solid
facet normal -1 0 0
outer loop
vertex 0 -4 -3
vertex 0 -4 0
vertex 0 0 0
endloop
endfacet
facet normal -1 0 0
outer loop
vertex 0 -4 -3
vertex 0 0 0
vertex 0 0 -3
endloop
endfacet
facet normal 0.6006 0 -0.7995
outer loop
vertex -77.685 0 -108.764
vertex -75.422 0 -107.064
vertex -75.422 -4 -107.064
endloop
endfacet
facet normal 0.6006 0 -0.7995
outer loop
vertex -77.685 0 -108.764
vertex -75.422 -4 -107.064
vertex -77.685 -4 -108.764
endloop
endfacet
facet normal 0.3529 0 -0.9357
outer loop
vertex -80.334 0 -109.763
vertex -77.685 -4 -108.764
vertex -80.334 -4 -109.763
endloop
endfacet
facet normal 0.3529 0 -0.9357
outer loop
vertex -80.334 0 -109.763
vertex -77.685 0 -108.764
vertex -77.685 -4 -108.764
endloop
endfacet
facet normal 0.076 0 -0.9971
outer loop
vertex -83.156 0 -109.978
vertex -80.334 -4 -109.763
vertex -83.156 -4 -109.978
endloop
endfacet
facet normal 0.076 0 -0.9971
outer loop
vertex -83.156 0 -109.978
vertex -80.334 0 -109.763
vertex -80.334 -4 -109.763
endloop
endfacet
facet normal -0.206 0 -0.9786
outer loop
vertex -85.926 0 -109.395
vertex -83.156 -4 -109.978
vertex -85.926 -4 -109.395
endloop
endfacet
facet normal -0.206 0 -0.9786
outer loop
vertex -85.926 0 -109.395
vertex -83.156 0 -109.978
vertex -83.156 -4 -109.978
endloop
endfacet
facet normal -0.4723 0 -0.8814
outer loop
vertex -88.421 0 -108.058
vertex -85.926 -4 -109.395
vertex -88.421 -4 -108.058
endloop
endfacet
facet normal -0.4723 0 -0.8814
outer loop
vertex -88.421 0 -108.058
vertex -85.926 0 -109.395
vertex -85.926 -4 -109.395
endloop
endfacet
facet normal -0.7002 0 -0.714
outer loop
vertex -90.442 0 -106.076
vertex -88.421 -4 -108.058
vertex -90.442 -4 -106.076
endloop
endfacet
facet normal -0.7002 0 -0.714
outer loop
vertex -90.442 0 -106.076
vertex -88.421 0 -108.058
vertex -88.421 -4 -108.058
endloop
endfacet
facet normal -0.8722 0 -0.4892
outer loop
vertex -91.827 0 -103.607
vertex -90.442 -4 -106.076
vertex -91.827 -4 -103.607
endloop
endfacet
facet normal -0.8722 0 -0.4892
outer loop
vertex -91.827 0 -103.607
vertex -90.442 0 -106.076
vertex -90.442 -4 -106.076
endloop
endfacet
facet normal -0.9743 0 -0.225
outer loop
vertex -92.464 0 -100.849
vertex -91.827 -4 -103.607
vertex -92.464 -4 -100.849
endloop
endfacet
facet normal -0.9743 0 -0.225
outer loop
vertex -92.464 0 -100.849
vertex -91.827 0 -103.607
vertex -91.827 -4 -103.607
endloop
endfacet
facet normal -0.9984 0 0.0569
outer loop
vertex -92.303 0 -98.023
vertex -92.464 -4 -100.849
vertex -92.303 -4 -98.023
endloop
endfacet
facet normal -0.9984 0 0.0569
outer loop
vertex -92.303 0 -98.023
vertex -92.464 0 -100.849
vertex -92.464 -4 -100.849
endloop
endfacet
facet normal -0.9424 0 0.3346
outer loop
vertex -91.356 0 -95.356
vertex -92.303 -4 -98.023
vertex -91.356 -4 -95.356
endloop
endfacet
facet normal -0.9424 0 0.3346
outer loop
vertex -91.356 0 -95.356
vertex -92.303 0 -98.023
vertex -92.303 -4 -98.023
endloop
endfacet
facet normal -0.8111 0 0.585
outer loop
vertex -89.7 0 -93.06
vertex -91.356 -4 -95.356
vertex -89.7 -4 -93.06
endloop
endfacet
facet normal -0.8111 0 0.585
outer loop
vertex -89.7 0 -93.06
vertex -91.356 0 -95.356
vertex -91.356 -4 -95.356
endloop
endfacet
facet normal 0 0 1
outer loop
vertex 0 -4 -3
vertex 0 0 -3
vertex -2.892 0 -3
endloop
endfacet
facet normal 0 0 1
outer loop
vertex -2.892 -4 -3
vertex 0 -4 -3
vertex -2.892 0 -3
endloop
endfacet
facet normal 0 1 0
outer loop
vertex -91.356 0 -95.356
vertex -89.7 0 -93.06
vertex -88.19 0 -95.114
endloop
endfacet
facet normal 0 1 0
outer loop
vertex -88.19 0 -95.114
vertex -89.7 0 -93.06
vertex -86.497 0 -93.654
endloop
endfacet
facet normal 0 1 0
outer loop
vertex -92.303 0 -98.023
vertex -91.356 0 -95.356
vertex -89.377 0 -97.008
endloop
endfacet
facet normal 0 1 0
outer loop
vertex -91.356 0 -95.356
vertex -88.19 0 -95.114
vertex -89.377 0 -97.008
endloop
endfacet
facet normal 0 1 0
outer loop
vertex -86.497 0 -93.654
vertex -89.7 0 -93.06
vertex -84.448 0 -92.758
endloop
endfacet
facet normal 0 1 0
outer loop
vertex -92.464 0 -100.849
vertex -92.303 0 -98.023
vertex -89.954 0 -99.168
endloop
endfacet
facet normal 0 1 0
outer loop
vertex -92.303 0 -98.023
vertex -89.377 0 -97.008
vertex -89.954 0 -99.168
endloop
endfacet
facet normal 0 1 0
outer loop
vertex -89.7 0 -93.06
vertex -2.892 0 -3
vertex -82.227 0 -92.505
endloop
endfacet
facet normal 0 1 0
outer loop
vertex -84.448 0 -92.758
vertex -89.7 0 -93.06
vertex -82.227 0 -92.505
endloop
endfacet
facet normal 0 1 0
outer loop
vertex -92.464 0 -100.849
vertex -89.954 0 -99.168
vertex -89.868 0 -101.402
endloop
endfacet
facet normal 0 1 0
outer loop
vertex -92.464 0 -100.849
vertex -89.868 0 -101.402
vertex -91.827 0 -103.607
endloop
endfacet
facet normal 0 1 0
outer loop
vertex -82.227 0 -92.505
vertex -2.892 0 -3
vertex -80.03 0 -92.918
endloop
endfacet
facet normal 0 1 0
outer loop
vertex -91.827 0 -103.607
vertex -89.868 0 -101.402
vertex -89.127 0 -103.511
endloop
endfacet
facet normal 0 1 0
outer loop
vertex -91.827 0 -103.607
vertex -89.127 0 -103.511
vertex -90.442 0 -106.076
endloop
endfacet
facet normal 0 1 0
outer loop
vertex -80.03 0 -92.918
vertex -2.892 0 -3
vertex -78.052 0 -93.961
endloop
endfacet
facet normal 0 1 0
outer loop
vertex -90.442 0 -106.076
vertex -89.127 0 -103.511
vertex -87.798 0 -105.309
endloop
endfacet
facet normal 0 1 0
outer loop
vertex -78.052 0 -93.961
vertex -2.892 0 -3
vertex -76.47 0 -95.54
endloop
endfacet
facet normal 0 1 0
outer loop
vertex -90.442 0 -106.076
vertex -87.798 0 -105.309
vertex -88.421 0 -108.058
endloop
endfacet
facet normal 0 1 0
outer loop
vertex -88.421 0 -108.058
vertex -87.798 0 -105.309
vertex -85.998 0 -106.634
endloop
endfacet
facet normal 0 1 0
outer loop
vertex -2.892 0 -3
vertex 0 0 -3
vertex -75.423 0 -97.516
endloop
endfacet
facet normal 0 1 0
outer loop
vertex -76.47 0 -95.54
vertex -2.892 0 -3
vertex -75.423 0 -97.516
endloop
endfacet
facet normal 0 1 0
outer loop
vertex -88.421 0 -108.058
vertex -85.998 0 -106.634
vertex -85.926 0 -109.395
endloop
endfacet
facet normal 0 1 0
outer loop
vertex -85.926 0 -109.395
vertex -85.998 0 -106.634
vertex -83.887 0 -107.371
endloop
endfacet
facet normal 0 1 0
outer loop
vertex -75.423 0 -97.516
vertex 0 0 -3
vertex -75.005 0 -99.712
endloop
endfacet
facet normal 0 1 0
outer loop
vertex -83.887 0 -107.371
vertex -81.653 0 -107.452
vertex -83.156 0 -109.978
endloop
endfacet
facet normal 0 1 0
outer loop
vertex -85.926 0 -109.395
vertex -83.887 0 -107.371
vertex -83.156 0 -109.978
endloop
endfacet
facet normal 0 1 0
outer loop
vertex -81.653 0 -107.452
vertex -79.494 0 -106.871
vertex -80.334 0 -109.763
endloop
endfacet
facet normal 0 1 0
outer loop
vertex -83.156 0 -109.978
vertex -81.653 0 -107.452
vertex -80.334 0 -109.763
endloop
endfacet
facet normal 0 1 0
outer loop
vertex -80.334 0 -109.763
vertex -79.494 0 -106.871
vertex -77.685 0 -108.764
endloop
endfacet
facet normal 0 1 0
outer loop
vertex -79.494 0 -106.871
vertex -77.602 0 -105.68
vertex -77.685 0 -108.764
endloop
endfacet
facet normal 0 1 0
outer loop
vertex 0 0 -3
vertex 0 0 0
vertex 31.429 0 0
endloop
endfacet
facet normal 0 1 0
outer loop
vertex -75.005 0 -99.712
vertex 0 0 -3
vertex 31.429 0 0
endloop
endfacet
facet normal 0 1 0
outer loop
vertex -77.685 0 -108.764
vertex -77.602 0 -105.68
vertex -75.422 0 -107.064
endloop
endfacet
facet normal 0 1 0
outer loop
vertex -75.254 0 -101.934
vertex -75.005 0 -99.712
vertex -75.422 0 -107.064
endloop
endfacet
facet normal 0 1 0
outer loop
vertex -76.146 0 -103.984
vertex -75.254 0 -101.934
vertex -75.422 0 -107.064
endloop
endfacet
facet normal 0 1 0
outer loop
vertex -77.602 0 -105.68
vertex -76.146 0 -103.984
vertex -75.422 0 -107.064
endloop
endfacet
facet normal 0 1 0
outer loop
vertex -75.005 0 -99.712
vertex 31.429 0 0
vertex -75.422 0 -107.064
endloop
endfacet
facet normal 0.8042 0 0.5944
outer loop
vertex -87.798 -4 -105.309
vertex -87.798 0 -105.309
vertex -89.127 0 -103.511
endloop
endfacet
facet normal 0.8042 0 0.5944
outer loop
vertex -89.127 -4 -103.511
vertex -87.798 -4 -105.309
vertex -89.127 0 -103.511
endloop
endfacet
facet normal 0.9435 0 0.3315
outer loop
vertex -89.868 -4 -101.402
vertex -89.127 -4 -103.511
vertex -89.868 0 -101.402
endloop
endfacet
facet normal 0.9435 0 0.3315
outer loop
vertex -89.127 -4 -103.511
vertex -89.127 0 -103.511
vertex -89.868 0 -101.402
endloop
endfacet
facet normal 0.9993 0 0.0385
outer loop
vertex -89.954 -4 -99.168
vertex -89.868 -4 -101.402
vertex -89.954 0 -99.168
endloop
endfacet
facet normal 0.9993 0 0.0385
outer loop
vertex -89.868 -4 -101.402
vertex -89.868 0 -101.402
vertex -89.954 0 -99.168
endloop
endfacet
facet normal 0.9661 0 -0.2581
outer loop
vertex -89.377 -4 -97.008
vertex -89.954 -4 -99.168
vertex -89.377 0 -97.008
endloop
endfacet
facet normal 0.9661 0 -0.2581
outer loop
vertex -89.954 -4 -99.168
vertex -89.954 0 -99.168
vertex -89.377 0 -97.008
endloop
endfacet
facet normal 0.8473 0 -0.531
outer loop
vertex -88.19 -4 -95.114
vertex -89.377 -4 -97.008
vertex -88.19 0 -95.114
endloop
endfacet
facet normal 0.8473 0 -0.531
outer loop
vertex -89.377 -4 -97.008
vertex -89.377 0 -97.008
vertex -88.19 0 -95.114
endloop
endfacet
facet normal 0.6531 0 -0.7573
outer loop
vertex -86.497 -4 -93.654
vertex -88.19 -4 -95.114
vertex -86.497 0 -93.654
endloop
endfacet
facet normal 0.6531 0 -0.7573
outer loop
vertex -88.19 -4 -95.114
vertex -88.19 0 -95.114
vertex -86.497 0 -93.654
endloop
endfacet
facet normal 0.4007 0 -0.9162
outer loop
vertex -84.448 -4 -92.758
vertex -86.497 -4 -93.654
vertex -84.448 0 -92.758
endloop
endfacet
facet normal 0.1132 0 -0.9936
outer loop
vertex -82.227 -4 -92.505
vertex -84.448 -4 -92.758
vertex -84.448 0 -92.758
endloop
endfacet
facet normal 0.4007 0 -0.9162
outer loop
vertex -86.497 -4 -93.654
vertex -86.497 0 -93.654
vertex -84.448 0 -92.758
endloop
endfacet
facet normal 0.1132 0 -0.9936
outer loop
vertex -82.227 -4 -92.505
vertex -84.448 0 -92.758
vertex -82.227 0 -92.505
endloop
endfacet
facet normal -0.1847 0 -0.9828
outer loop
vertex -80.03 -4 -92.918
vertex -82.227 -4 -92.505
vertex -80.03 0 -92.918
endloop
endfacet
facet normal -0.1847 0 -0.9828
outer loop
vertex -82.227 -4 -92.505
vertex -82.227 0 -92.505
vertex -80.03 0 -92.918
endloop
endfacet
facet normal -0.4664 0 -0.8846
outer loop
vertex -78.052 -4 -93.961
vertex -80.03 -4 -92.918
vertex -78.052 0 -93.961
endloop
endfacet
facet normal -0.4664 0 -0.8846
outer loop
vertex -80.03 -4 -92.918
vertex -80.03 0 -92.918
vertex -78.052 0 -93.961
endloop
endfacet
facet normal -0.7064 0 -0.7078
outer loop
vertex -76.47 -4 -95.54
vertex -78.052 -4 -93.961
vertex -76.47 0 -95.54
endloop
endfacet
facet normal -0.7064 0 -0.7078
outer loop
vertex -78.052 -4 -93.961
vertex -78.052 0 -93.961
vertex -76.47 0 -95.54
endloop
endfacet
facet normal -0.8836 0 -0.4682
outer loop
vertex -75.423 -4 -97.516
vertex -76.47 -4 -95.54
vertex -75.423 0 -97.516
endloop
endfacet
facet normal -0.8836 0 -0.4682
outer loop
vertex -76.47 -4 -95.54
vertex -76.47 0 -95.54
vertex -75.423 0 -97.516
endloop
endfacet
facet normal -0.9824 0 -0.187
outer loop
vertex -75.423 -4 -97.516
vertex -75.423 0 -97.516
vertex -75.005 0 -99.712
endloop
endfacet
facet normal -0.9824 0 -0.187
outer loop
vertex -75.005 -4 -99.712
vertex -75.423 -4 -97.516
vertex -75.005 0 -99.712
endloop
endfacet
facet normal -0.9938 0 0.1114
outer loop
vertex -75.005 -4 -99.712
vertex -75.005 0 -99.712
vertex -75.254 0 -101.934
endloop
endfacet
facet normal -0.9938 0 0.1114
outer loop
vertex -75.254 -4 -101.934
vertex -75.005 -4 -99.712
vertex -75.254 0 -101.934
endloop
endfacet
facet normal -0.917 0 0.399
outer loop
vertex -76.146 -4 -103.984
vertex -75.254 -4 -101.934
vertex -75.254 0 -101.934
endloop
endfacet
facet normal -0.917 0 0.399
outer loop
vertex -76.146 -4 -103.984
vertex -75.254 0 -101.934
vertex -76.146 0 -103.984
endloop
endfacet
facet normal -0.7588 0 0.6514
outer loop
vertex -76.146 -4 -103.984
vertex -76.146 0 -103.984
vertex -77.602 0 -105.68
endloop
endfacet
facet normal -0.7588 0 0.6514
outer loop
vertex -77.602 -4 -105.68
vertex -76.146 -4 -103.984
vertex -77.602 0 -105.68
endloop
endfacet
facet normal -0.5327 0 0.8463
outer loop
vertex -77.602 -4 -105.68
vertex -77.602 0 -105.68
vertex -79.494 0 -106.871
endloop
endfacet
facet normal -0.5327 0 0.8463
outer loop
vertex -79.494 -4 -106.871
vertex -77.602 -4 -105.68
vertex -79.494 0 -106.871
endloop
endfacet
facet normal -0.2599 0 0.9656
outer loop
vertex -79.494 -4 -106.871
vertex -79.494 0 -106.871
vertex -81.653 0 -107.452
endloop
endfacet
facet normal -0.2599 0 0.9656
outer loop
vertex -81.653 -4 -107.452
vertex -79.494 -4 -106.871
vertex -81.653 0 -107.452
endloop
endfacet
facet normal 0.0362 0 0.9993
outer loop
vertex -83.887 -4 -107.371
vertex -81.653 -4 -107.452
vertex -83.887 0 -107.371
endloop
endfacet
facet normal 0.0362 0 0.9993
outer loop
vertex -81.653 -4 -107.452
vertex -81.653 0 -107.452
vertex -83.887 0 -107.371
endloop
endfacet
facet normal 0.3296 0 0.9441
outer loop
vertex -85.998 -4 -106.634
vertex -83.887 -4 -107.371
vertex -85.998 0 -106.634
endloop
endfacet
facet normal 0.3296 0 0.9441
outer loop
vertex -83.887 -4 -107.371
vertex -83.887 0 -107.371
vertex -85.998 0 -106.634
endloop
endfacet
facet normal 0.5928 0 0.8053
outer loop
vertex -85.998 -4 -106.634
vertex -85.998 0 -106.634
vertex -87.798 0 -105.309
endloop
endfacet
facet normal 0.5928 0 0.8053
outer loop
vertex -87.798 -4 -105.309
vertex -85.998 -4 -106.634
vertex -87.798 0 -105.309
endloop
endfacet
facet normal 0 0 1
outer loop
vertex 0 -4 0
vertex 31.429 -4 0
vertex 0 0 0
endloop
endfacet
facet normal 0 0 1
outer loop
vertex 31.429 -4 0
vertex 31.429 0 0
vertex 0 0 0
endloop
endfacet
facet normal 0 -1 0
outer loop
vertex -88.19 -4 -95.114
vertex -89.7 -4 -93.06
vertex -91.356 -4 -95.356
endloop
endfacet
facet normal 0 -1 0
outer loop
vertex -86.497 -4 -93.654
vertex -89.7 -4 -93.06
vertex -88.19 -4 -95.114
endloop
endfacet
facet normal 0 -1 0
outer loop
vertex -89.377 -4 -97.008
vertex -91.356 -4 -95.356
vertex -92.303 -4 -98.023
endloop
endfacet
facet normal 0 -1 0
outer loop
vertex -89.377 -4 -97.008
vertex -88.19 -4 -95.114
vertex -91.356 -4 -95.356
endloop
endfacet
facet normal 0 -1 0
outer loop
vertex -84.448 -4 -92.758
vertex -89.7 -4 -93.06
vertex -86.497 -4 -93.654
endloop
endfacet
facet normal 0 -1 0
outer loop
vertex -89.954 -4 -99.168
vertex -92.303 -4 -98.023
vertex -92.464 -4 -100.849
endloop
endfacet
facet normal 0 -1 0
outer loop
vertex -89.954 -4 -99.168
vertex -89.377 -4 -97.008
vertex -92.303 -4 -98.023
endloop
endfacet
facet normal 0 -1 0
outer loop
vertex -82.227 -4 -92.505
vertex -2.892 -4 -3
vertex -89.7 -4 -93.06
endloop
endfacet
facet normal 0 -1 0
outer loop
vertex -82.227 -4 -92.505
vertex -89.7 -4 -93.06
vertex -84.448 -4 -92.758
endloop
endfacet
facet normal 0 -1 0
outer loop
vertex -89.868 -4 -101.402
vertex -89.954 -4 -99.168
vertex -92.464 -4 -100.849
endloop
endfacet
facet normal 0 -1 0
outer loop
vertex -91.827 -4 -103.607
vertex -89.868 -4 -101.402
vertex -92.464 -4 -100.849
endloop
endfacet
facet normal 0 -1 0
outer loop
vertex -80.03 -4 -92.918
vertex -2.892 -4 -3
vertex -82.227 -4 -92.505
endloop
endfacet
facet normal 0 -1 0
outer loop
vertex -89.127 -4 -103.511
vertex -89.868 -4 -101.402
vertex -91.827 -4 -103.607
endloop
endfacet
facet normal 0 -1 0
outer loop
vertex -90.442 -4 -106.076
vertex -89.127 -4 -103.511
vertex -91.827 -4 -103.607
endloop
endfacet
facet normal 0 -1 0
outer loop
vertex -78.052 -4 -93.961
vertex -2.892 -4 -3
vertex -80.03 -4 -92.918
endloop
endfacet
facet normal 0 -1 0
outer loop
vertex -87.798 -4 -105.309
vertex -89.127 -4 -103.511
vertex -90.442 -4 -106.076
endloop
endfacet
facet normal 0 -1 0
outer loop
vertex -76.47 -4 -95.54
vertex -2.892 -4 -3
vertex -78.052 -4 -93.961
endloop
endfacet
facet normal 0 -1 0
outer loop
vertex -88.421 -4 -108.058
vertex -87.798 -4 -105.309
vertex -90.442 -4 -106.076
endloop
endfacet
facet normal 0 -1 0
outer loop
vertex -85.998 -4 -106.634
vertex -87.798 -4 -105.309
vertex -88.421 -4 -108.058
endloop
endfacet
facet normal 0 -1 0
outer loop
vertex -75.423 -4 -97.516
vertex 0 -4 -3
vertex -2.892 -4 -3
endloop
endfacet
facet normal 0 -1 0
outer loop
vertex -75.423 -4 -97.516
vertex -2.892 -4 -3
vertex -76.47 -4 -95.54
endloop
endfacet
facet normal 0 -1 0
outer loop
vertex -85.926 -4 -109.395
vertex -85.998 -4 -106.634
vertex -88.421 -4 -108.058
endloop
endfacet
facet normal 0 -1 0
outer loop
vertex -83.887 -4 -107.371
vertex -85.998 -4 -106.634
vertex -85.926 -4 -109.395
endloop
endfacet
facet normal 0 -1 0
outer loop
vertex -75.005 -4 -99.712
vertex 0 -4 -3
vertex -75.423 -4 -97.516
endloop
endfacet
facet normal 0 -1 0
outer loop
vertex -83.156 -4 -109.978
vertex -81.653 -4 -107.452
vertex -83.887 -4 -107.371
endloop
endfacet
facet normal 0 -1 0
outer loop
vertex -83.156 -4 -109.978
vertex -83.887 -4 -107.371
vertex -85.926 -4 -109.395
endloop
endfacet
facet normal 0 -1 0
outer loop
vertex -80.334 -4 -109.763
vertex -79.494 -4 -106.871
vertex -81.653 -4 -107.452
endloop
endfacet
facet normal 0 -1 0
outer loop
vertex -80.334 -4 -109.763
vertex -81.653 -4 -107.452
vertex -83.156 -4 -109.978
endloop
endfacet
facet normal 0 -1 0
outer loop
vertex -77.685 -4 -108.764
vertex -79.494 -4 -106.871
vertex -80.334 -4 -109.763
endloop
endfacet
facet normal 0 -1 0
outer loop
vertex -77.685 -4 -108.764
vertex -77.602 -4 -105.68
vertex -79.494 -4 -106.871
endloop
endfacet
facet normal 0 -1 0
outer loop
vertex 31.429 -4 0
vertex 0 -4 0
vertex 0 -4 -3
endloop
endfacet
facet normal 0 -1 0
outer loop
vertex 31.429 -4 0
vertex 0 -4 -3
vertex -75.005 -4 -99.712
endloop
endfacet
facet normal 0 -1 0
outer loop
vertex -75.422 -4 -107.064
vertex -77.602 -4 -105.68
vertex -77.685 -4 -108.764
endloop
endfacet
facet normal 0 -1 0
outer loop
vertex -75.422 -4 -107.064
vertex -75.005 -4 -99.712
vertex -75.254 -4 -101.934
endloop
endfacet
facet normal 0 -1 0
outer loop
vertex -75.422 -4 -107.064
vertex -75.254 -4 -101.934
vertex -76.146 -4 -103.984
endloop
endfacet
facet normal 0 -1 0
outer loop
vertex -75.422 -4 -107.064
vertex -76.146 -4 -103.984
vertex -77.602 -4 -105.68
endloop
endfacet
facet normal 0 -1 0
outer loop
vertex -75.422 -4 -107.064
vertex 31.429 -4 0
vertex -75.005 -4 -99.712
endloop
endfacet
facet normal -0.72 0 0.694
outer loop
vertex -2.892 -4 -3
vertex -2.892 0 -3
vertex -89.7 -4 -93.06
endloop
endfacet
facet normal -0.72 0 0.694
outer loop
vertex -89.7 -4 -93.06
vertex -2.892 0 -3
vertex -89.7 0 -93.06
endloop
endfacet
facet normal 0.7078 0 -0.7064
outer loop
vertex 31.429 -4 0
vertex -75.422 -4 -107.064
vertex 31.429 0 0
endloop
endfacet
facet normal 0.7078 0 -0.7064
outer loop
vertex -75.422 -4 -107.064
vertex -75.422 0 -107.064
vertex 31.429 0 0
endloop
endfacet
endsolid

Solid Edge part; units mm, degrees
sketch "Sketch1" plane through (0, 0, 0) normal (0, -1, 0) x (1, 0, 0)
  line L0 (0, 0) -> (-89.6999, -93.0601)
  line L1 (-75.4219, -107.064) -> (31.4288, 0)
  line L2 (31.4288, 0) -> (0, 0)
  arc A0 (-75.4219, -107.064) -> (-89.6999, -93.0601) centre (-82.5, -100) cw
extrude "Protrusion1" add sketch "Sketch1" along normal blind 4
sketch "Sketch2" plane through (-30.5356, 0, -55) normal (0, 1, 0) x (-0.7064012, 0, -0.7078117)
  circle A0 centre (68.5592, 4.9929) radius 7.5
extrude "Cutout1" cut sketch "Sketch2" against normal up to next
sketch "Sketch3" plane through (-30.5356, -4, -55) normal (0, -1, 0) x (0.7064012, 0, 0.7078117)
  line L0 (58.3766, 15.1194) -> (56.3339, 17.1662)
  line L1 (56.3339, 17.1662) -> (60.5, 17.2386)
  line L2 (60.5, 17.2386) -> (58.3766, 15.1194)
extrude "Cutout2" cut sketch "Sketch3" against normal up to next
properties material "Stainless steel"
